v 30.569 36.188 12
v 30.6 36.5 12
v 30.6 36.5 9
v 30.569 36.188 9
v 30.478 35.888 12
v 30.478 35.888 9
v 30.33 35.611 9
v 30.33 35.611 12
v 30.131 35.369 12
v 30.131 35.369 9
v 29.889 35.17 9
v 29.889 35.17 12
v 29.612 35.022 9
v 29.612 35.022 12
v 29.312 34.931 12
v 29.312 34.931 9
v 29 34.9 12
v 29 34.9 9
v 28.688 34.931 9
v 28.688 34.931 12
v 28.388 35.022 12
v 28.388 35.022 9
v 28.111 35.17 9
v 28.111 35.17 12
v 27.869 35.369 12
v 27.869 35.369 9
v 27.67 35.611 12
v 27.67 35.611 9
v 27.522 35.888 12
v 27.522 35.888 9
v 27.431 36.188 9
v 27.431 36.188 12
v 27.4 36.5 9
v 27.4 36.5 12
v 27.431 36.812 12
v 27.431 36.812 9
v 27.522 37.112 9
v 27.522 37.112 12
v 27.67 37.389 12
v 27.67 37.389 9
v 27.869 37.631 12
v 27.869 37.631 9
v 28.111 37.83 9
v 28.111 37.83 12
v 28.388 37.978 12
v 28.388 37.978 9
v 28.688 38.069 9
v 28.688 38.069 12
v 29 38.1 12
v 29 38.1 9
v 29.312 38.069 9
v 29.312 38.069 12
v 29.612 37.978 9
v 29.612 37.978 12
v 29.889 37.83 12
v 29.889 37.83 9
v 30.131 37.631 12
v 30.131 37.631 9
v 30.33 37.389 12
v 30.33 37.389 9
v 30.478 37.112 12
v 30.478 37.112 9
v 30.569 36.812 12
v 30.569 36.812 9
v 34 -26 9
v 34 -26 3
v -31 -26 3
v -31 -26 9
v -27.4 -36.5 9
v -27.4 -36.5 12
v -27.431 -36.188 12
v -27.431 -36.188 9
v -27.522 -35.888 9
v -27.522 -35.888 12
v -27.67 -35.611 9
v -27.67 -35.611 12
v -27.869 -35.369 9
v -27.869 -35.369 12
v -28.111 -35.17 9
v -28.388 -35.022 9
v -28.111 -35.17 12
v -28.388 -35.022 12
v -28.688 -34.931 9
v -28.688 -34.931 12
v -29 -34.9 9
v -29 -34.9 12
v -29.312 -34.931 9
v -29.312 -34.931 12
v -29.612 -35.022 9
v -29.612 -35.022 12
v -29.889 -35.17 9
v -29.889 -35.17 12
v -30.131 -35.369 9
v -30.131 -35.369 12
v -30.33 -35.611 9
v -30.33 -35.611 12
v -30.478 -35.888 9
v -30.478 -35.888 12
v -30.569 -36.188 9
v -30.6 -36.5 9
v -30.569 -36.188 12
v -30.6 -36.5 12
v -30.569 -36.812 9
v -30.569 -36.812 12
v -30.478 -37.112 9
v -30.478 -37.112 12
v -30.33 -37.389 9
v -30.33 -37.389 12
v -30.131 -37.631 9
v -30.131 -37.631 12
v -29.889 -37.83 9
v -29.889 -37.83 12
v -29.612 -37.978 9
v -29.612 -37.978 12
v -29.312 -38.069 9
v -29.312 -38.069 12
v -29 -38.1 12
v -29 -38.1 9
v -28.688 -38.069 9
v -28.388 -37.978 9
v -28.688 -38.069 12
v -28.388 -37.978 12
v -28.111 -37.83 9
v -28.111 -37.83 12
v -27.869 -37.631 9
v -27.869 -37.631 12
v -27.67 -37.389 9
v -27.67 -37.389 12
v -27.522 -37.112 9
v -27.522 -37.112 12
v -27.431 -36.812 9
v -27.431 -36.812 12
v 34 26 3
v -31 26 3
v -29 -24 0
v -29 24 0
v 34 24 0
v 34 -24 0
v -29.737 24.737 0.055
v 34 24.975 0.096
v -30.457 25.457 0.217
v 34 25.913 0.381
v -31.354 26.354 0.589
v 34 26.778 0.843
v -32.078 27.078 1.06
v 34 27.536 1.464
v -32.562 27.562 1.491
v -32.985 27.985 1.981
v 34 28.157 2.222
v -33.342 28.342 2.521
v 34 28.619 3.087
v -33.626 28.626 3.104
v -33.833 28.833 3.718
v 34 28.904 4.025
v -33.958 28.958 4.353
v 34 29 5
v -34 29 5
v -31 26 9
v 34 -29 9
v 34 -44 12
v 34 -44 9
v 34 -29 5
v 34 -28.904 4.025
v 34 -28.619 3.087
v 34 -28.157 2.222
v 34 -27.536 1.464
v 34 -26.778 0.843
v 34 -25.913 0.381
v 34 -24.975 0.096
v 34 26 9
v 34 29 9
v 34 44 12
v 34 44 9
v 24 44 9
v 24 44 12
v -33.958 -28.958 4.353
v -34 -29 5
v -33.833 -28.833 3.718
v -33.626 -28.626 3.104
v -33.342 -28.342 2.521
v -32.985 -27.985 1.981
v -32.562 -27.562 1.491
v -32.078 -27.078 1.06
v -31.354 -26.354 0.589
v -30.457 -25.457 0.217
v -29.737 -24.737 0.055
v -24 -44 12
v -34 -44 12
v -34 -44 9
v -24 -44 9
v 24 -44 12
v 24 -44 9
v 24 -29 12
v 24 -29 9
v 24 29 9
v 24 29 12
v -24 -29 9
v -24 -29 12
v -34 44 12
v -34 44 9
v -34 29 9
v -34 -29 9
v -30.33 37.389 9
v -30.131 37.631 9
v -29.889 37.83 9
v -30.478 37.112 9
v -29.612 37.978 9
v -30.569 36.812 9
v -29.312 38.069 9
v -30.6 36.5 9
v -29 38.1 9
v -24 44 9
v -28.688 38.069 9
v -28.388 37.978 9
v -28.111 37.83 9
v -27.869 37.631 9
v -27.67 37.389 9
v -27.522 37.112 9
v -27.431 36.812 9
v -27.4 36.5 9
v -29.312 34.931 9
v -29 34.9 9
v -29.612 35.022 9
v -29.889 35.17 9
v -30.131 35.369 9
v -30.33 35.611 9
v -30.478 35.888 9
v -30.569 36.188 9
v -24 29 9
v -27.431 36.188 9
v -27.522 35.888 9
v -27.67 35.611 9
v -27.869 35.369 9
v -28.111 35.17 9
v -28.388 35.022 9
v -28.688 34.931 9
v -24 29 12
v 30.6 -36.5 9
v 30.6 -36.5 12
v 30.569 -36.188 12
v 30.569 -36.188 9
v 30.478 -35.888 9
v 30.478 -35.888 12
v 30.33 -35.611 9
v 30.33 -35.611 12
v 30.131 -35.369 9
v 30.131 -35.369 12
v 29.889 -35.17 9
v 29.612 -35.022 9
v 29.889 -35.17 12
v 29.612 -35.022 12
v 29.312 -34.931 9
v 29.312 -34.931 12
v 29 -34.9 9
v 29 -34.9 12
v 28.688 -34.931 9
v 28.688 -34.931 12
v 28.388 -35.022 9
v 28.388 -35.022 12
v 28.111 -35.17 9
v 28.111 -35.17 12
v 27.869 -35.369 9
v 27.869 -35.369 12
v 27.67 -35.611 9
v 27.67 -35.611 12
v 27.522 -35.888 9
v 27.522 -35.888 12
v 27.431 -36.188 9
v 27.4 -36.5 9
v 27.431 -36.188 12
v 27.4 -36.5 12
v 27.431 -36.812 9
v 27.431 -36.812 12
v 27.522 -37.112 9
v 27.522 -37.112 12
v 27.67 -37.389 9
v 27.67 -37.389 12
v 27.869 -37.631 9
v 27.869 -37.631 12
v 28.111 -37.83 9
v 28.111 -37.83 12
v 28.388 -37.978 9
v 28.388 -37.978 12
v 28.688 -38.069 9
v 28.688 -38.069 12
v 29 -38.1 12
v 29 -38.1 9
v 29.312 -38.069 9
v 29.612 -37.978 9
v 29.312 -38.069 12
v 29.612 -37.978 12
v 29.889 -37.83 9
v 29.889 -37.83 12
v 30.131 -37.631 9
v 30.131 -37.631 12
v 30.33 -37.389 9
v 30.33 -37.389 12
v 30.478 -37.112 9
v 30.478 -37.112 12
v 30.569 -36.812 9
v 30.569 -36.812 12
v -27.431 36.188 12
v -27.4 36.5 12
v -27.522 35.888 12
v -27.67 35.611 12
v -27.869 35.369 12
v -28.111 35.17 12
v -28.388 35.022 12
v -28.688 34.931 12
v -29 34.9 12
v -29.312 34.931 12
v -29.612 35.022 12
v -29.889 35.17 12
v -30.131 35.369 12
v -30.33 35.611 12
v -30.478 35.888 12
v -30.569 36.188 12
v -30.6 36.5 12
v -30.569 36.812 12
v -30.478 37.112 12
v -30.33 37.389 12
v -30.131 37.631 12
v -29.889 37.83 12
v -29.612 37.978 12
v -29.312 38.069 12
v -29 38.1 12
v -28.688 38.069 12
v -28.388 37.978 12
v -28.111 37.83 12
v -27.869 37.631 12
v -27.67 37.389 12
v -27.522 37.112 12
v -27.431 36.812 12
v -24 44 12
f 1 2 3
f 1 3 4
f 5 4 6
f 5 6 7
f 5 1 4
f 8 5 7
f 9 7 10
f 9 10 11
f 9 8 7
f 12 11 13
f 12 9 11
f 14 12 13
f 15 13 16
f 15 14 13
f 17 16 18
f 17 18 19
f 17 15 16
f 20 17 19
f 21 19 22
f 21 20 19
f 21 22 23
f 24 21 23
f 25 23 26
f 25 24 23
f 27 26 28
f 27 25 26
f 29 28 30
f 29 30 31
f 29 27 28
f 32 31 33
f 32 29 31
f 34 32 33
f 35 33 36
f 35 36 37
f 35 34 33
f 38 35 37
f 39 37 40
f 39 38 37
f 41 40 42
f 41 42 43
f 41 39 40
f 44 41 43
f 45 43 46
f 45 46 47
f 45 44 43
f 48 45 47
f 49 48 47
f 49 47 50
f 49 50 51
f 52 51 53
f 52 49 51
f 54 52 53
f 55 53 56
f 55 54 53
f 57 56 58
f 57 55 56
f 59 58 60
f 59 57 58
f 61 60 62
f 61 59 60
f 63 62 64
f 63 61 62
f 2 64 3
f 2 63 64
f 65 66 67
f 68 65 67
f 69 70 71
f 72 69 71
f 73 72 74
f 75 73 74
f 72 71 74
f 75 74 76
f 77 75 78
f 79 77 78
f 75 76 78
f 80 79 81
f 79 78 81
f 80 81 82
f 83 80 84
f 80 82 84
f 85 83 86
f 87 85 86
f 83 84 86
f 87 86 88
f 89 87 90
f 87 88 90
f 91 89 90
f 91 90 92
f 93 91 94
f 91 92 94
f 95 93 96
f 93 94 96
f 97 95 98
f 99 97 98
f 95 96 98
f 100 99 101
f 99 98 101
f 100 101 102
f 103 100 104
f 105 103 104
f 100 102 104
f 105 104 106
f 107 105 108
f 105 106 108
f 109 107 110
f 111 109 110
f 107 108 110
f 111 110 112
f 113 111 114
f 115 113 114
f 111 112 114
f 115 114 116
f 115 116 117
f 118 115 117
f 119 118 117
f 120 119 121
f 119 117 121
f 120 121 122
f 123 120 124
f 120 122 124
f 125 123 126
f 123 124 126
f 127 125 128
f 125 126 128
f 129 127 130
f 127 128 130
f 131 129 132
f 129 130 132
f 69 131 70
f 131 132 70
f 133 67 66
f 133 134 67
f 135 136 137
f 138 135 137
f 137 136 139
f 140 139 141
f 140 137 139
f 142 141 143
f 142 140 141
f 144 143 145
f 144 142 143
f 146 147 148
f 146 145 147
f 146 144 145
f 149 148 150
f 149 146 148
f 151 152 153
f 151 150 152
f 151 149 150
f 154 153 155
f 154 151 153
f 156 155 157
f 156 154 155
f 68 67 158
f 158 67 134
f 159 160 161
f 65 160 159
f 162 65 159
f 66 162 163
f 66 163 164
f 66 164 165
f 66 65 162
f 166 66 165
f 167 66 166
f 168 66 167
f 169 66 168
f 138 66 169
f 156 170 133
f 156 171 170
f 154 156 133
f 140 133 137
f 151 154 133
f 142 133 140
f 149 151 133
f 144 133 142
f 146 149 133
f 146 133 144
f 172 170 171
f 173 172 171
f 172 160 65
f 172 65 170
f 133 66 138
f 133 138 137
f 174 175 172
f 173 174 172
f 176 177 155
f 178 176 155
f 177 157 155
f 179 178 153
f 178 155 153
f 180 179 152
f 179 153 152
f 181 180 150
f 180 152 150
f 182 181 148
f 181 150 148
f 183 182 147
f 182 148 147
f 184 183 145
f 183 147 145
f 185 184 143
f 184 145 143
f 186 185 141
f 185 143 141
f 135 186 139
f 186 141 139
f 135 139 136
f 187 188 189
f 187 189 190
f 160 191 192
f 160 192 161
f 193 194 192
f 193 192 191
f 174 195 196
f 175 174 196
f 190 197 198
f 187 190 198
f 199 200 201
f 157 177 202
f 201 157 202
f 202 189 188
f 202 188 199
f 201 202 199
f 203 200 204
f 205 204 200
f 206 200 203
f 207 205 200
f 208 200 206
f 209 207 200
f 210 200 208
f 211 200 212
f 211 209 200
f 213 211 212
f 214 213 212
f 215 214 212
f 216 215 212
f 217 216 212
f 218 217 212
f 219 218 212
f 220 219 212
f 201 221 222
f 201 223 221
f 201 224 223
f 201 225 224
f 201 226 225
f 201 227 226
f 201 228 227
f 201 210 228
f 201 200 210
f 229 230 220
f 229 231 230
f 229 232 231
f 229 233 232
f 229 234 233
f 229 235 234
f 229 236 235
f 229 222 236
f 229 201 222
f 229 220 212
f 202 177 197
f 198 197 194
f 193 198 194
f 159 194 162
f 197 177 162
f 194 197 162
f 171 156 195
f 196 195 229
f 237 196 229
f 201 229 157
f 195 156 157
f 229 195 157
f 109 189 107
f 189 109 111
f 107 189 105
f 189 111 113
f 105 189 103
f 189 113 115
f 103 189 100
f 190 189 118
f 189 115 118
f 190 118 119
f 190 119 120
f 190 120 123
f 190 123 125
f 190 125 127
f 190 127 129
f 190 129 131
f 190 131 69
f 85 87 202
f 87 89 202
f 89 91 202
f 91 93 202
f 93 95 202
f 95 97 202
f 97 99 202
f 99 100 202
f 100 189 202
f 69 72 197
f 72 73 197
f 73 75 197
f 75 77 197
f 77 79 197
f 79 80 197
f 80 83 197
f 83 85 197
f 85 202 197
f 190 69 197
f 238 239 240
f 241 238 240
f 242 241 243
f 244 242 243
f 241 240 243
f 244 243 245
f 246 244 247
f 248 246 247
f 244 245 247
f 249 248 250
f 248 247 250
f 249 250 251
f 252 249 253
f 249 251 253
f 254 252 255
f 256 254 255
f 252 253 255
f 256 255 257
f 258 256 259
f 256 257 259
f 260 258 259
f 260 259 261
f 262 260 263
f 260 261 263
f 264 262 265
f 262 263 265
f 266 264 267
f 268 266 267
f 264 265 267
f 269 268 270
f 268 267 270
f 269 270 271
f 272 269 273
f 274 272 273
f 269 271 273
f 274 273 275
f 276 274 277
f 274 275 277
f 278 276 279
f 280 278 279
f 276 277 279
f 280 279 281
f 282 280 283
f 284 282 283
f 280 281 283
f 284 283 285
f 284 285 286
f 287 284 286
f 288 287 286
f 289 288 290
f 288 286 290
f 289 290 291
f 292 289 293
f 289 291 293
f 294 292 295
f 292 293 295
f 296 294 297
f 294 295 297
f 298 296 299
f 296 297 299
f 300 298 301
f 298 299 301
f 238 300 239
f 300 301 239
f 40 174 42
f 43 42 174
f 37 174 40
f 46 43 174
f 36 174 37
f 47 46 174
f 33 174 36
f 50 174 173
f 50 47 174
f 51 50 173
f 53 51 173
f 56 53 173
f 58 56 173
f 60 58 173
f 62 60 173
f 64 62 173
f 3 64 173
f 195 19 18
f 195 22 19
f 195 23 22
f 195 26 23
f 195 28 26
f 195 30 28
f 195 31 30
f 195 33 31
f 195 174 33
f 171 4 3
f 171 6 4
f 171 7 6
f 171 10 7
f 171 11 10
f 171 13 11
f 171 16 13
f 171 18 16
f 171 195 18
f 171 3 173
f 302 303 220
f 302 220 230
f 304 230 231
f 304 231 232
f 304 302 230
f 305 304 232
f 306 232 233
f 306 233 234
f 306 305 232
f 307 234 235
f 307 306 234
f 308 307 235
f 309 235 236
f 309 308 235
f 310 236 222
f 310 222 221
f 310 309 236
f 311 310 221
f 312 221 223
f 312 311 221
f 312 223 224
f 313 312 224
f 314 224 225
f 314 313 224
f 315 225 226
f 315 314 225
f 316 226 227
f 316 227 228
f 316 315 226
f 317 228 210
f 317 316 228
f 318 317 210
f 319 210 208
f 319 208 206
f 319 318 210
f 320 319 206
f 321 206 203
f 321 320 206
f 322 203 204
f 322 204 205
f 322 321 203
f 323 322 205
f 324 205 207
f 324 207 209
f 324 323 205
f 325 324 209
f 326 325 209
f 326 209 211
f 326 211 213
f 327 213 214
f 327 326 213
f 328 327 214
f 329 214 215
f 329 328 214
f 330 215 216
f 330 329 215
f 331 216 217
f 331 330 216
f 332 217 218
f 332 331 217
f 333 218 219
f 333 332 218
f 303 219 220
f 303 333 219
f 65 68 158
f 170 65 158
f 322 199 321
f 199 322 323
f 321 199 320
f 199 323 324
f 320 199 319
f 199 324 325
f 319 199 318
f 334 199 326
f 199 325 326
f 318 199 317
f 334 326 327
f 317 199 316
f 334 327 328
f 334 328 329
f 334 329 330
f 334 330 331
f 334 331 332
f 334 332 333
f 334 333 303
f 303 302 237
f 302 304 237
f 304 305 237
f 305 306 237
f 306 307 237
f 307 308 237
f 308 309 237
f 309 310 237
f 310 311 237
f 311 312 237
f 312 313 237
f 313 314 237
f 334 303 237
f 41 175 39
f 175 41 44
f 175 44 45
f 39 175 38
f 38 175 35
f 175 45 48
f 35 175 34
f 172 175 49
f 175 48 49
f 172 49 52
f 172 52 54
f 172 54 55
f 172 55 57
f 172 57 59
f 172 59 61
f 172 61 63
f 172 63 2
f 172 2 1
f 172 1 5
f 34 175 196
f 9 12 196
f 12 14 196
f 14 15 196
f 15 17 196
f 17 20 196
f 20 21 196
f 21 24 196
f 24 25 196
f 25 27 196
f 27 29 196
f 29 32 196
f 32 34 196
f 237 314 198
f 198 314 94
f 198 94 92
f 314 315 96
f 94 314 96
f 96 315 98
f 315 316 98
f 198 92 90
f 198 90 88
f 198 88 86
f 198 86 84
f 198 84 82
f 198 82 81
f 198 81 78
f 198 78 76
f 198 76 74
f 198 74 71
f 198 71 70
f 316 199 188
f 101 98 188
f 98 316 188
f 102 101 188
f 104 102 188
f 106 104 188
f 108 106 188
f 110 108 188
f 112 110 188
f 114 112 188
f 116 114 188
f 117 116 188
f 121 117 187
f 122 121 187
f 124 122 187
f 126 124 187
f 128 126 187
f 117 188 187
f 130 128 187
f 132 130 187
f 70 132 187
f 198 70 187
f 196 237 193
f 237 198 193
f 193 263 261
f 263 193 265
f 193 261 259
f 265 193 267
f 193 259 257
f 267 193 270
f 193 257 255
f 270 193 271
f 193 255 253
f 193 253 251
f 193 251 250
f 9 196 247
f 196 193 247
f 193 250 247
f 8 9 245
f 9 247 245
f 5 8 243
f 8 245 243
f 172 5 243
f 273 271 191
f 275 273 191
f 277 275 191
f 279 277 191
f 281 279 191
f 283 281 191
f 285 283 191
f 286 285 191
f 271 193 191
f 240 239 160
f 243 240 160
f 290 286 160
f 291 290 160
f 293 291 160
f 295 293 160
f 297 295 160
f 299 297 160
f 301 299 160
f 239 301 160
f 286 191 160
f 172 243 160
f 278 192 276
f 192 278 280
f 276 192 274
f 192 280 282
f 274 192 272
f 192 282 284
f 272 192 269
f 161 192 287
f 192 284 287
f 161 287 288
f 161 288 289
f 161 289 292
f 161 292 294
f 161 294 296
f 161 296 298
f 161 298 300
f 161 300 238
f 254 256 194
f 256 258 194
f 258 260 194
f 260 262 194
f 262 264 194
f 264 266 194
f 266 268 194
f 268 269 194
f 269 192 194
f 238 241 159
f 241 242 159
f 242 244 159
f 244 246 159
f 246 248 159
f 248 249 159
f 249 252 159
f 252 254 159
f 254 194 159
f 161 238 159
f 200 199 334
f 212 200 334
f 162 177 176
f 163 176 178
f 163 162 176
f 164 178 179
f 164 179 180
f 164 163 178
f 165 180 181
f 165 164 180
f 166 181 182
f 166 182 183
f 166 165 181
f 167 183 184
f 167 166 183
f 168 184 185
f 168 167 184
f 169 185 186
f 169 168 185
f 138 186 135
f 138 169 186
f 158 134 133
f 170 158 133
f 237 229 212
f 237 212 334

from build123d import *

# Parameters (mm, degrees)
ESQUISSE1_W             = 68
ESQUISSE1_H             = 58
BOSS_EXTRU_1_DEPTH      = 3
BOSS_EXTRU_2_DEPTH      = 9
ESQUISSE4_W             = 3
ESQUISSE4_H             = 52
BOSS_EXTRU_3_DEPTH      = 65
ESQUISSE6_W             = 10
ESQUISSE6_H             = 3
BOSS_EXTRU_4_DEPTH      = 15
ESQUISSE7_R             = 1.6
ENL_V_MAT_EXTRU_1_DEPTH = 3
CONG_1_R                = 5


with BuildPart() as part:
    # Esquisse1 → Boss.-Extru.1 (new body)
    with BuildSketch(Plane.XY):
        Rectangle(ESQUISSE1_W, ESQUISSE1_H)
    extrude(amount=BOSS_EXTRU_1_DEPTH)

    # Esquisse2 → Boss.-Extru.2 (add)
    with BuildSketch(Plane.XY.offset(3)):
        Polygon((34, 26), (34, 29), (-34, 29), (-34, -29), (34, -29), (34, -26), (-31, -26), (-31, 26), align=None)
    extrude(amount=BOSS_EXTRU_2_DEPTH)

    # Esquisse4 → Boss.-Extru.3 (add)
    with BuildSketch(Plane(origin=(-31, 0, 0), x_dir=(0, 0, -1), z_dir=(1, 0, 0))):
        with Locations((-10.5, 0)):
            Rectangle(ESQUISSE4_W, ESQUISSE4_H)
    extrude(amount=BOSS_EXTRU_3_DEPTH)

    # Esquisse6 → Boss.-Extru.4 (add)
    with BuildSketch(Plane.XZ.offset(29)):
        with Locations((-29, 10.5)):
            Rectangle(ESQUISSE6_W, ESQUISSE6_H)
        with Locations((29, 10.5)):
            Rectangle(ESQUISSE6_W, ESQUISSE6_H)
    boss_extru_4 = extrude(amount=BOSS_EXTRU_4_DEPTH)

    # Esquisse7 → Enlèv. mat.-Extru.1 (cut)
    with BuildSketch(Plane.XY.offset(12)):
        with Locations((-29, -36.5)):
            Circle(ESQUISSE7_R)
        with Locations((29, -36.5)):
            Circle(ESQUISSE7_R)
    enl_v_mat_extru_1 = extrude(amount=-ENL_V_MAT_EXTRU_1_DEPTH, mode=Mode.SUBTRACT)

    # Symétrie1: Boss.-Extru.4, Enlèv. mat.-Extru.1 across plane
    add(boss_extru_4.mirror(Plane.ZX))
    add(enl_v_mat_extru_1.mirror(Plane.ZX), mode=Mode.SUBTRACT)

    # Congé1
    cong_1_edges = [part.edges().sort_by_distance(p)[0] for p in [
        (0, -29, 0),
        (-34, 0, 0),
        (0, 29, 0),
    ]]
    fillet(cong_1_edges, radius=CONG_1_R)


solid = part.part
